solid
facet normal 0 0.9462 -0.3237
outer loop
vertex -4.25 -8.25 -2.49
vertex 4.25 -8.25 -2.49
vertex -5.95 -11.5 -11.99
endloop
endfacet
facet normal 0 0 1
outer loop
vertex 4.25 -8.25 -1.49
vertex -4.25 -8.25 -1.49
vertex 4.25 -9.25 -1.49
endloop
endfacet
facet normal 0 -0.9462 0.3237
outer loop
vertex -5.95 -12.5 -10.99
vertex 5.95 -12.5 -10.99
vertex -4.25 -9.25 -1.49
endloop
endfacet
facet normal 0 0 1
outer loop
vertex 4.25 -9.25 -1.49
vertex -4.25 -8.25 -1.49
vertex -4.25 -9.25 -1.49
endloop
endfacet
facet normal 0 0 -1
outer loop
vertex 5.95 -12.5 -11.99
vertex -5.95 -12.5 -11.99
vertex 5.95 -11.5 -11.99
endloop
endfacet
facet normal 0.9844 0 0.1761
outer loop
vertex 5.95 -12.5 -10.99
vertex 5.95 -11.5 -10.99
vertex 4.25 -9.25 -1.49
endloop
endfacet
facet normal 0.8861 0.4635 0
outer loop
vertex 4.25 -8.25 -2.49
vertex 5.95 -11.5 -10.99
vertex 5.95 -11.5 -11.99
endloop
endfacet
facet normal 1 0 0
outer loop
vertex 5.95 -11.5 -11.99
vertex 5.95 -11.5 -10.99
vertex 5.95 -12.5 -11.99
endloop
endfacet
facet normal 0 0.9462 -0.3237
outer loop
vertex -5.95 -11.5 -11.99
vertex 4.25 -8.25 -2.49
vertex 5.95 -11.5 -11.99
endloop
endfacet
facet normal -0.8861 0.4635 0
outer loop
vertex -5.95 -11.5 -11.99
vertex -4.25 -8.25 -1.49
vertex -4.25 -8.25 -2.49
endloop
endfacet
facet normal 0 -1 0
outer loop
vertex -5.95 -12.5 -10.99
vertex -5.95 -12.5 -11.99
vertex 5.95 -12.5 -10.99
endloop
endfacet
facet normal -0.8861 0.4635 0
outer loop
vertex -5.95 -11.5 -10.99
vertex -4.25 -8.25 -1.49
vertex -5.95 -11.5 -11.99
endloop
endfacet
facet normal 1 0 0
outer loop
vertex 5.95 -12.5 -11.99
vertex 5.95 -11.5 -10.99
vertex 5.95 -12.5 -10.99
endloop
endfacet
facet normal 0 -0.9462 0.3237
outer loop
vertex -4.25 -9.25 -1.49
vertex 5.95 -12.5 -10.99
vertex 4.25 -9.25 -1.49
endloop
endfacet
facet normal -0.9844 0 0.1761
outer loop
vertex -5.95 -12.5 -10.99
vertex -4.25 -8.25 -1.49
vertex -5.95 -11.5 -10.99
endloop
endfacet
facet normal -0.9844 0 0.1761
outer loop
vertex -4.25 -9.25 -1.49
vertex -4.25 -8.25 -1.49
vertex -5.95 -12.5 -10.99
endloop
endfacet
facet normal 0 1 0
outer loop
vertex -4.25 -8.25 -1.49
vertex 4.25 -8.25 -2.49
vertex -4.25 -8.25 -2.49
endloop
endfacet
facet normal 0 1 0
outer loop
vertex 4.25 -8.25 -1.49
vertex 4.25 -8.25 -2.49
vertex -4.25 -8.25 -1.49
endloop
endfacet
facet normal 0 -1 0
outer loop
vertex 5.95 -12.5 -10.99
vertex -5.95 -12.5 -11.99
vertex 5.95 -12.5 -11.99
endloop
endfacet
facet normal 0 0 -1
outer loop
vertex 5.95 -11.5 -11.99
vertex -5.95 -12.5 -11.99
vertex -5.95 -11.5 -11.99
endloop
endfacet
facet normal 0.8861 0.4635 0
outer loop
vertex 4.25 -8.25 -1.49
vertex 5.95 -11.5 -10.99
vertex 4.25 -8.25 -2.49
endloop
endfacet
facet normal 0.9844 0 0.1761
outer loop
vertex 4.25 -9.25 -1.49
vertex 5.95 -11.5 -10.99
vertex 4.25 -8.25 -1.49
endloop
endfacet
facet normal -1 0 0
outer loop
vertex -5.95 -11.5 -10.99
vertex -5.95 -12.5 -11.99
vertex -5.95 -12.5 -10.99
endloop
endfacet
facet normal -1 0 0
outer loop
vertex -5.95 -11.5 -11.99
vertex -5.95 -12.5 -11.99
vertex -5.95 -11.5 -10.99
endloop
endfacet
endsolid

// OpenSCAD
hull() {
										multmatrix([[1, 0, 0, 0], [0, 1, 0, -8.75], [0, 0, 1, -1.99], [0, 0, 0, 1]]) {
											cube(size = [8.5, 1, 1], center = true);
										}
										multmatrix([[1, 0, 0, 0], [0, 1, 0, -12], [0, 0, 1, -11.49], [0, 0, 0, 1]]) {
											cube(size = [11.9, 1, 1], center = true);
										}
									}
